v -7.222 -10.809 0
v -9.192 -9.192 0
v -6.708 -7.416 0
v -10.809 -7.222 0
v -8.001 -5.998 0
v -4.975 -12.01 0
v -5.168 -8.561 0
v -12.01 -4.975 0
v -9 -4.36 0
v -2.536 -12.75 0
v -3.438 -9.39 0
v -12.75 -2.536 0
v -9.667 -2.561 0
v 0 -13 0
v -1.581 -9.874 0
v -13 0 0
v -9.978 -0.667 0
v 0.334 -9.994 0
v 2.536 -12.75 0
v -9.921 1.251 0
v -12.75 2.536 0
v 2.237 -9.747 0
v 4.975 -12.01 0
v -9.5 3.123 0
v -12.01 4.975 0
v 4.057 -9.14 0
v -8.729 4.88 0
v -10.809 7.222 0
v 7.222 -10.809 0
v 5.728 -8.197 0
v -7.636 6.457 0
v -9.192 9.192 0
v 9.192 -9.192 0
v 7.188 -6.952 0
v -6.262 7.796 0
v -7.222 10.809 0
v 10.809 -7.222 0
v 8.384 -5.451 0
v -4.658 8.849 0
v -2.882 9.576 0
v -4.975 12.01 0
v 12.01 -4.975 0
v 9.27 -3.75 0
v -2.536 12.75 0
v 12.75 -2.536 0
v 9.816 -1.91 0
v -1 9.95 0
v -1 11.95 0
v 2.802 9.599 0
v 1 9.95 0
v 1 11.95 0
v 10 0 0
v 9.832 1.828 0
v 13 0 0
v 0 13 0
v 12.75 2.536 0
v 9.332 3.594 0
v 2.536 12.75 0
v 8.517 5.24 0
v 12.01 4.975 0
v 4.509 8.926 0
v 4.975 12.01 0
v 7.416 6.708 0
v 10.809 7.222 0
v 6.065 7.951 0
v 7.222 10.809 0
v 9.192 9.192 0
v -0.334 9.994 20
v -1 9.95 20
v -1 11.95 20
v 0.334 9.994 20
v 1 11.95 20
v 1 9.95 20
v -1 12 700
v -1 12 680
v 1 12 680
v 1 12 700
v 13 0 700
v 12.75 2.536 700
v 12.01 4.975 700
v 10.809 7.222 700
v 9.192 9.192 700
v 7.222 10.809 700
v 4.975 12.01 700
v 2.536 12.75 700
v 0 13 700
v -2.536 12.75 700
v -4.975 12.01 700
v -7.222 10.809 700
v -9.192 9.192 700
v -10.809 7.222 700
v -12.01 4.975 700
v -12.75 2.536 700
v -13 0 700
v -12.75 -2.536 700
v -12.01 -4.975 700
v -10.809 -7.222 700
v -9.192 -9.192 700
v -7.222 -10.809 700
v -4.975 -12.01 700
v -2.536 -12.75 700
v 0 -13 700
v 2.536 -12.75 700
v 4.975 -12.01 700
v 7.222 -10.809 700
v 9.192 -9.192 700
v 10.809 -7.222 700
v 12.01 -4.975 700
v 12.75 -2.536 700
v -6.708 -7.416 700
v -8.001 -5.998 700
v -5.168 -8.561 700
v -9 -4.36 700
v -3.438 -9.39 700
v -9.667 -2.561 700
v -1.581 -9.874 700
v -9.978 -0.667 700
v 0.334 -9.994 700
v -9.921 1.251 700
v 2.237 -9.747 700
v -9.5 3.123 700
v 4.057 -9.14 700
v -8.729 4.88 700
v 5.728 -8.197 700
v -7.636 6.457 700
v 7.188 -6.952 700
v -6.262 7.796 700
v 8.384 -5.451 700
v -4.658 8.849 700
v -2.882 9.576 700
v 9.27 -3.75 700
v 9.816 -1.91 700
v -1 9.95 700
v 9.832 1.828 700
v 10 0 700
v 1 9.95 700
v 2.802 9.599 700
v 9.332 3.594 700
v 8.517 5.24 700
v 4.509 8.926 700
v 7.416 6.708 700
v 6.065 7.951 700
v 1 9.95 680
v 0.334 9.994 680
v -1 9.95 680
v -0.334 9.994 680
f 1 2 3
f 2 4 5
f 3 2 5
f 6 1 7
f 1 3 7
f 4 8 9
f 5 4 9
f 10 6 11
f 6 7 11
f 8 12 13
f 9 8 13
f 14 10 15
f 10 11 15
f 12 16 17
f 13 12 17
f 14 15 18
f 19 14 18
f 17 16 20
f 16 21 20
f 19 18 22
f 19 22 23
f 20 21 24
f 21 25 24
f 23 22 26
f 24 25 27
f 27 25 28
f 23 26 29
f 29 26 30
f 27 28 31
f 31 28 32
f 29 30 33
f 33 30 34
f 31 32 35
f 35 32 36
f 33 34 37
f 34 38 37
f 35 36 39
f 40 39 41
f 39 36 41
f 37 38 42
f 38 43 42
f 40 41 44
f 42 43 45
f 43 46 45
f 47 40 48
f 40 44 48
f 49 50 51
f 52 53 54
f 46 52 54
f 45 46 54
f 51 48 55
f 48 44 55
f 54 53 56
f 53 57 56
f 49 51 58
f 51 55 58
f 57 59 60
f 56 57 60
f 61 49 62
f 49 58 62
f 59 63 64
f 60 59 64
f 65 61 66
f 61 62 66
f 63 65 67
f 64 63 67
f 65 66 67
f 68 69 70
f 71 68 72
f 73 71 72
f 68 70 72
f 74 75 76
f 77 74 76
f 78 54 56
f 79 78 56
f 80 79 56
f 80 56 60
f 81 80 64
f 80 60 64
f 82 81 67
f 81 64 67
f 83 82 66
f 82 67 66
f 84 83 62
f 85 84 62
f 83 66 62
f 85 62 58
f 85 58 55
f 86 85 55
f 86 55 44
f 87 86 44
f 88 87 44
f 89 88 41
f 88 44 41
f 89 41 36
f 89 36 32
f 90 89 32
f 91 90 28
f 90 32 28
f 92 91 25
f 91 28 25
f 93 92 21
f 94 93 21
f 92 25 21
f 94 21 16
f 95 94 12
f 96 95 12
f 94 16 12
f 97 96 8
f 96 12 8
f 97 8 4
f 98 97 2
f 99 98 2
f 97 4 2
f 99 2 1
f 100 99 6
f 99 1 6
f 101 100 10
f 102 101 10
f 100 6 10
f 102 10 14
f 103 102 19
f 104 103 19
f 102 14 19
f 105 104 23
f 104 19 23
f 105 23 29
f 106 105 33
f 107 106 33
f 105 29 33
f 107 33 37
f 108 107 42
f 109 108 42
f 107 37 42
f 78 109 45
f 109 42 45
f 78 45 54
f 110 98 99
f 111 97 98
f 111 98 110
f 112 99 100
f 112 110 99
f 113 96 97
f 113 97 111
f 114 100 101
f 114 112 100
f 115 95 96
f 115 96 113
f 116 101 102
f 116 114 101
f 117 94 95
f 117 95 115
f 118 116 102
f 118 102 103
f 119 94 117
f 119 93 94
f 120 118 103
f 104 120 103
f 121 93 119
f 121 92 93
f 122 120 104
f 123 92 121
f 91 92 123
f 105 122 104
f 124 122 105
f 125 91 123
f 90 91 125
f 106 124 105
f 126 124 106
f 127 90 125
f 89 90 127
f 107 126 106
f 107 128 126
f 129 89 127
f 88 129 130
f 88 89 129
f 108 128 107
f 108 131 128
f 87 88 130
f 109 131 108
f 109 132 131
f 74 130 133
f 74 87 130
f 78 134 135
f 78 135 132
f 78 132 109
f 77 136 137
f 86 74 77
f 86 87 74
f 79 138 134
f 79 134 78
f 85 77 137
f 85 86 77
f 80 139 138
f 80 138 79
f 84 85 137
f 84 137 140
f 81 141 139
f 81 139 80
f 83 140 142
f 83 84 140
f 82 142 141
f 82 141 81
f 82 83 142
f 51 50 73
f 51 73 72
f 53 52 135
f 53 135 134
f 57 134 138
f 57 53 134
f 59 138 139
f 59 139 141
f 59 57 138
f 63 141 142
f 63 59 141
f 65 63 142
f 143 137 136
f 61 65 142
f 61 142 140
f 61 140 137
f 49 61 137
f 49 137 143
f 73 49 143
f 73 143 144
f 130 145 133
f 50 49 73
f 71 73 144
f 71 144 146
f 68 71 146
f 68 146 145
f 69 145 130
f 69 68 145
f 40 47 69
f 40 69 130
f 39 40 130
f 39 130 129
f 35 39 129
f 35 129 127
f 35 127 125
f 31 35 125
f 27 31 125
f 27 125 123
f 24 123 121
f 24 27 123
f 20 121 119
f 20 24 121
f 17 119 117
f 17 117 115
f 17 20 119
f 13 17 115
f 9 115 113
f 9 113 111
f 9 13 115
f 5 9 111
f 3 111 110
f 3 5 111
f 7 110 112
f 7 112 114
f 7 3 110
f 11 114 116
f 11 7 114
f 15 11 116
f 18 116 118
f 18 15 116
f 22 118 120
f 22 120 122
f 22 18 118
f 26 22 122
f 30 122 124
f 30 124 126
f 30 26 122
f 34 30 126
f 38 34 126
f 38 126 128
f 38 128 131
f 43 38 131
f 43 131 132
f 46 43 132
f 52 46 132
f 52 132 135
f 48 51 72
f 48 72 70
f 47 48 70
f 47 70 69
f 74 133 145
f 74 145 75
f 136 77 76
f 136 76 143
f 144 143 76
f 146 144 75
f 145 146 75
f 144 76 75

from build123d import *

# Parameters (mm, degrees)
SKETCH1_R           = 13
SKETCH1_R_2         = 10
BOSS_EXTRUDE1_DEPTH = 700
CUT_EXTRUDE1_START  = -20
CUT_EXTRUDE1_DEPTH  = 20
CUT_EXTRUDE2_DEPTH  = 20


with BuildPart() as part:
    # Sketch1 → Boss-Extrude1 (new body)
    with BuildSketch(Plane.XY):
        Circle(SKETCH1_R)
        Circle(SKETCH1_R_2, mode=Mode.SUBTRACT)
    extrude(amount=BOSS_EXTRUDE1_DEPTH)

    # Sketch2 → Cut-Extrude1 (cut)
    with BuildSketch(Plane.XY.offset(700).offset(CUT_EXTRUDE1_START)):
        with BuildLine():
            Line((-1, 9.949874371), (-1, 12))
            Line((-1, 12), (1, 12))
            Line((1, 12), (1, 9.949874371))
            ThreePointArc((1, 9.949874371), (0, 10), (-1, 9.949874371))
        make_face()
    extrude(amount=CUT_EXTRUDE1_DEPTH, mode=Mode.SUBTRACT)

    # Sketch3 → Cut-Extrude2 (cut)
    with BuildSketch(Plane(origin=(0, 0, 0), x_dir=(-1, 0, 0), z_dir=(0, 0, -1))):
        with BuildLine():
            Line((-1, 9.949874371), (-1, 11.949874371))
            Line((-1, 11.949874371), (1, 11.949874371))
            Line((1, 11.949874371), (1, 9.949874371))
            ThreePointArc((1, 9.949874371), (0, 10), (-1, 9.949874371))
        make_face()
    extrude(amount=-CUT_EXTRUDE2_DEPTH, mode=Mode.SUBTRACT)


solid = part.part
